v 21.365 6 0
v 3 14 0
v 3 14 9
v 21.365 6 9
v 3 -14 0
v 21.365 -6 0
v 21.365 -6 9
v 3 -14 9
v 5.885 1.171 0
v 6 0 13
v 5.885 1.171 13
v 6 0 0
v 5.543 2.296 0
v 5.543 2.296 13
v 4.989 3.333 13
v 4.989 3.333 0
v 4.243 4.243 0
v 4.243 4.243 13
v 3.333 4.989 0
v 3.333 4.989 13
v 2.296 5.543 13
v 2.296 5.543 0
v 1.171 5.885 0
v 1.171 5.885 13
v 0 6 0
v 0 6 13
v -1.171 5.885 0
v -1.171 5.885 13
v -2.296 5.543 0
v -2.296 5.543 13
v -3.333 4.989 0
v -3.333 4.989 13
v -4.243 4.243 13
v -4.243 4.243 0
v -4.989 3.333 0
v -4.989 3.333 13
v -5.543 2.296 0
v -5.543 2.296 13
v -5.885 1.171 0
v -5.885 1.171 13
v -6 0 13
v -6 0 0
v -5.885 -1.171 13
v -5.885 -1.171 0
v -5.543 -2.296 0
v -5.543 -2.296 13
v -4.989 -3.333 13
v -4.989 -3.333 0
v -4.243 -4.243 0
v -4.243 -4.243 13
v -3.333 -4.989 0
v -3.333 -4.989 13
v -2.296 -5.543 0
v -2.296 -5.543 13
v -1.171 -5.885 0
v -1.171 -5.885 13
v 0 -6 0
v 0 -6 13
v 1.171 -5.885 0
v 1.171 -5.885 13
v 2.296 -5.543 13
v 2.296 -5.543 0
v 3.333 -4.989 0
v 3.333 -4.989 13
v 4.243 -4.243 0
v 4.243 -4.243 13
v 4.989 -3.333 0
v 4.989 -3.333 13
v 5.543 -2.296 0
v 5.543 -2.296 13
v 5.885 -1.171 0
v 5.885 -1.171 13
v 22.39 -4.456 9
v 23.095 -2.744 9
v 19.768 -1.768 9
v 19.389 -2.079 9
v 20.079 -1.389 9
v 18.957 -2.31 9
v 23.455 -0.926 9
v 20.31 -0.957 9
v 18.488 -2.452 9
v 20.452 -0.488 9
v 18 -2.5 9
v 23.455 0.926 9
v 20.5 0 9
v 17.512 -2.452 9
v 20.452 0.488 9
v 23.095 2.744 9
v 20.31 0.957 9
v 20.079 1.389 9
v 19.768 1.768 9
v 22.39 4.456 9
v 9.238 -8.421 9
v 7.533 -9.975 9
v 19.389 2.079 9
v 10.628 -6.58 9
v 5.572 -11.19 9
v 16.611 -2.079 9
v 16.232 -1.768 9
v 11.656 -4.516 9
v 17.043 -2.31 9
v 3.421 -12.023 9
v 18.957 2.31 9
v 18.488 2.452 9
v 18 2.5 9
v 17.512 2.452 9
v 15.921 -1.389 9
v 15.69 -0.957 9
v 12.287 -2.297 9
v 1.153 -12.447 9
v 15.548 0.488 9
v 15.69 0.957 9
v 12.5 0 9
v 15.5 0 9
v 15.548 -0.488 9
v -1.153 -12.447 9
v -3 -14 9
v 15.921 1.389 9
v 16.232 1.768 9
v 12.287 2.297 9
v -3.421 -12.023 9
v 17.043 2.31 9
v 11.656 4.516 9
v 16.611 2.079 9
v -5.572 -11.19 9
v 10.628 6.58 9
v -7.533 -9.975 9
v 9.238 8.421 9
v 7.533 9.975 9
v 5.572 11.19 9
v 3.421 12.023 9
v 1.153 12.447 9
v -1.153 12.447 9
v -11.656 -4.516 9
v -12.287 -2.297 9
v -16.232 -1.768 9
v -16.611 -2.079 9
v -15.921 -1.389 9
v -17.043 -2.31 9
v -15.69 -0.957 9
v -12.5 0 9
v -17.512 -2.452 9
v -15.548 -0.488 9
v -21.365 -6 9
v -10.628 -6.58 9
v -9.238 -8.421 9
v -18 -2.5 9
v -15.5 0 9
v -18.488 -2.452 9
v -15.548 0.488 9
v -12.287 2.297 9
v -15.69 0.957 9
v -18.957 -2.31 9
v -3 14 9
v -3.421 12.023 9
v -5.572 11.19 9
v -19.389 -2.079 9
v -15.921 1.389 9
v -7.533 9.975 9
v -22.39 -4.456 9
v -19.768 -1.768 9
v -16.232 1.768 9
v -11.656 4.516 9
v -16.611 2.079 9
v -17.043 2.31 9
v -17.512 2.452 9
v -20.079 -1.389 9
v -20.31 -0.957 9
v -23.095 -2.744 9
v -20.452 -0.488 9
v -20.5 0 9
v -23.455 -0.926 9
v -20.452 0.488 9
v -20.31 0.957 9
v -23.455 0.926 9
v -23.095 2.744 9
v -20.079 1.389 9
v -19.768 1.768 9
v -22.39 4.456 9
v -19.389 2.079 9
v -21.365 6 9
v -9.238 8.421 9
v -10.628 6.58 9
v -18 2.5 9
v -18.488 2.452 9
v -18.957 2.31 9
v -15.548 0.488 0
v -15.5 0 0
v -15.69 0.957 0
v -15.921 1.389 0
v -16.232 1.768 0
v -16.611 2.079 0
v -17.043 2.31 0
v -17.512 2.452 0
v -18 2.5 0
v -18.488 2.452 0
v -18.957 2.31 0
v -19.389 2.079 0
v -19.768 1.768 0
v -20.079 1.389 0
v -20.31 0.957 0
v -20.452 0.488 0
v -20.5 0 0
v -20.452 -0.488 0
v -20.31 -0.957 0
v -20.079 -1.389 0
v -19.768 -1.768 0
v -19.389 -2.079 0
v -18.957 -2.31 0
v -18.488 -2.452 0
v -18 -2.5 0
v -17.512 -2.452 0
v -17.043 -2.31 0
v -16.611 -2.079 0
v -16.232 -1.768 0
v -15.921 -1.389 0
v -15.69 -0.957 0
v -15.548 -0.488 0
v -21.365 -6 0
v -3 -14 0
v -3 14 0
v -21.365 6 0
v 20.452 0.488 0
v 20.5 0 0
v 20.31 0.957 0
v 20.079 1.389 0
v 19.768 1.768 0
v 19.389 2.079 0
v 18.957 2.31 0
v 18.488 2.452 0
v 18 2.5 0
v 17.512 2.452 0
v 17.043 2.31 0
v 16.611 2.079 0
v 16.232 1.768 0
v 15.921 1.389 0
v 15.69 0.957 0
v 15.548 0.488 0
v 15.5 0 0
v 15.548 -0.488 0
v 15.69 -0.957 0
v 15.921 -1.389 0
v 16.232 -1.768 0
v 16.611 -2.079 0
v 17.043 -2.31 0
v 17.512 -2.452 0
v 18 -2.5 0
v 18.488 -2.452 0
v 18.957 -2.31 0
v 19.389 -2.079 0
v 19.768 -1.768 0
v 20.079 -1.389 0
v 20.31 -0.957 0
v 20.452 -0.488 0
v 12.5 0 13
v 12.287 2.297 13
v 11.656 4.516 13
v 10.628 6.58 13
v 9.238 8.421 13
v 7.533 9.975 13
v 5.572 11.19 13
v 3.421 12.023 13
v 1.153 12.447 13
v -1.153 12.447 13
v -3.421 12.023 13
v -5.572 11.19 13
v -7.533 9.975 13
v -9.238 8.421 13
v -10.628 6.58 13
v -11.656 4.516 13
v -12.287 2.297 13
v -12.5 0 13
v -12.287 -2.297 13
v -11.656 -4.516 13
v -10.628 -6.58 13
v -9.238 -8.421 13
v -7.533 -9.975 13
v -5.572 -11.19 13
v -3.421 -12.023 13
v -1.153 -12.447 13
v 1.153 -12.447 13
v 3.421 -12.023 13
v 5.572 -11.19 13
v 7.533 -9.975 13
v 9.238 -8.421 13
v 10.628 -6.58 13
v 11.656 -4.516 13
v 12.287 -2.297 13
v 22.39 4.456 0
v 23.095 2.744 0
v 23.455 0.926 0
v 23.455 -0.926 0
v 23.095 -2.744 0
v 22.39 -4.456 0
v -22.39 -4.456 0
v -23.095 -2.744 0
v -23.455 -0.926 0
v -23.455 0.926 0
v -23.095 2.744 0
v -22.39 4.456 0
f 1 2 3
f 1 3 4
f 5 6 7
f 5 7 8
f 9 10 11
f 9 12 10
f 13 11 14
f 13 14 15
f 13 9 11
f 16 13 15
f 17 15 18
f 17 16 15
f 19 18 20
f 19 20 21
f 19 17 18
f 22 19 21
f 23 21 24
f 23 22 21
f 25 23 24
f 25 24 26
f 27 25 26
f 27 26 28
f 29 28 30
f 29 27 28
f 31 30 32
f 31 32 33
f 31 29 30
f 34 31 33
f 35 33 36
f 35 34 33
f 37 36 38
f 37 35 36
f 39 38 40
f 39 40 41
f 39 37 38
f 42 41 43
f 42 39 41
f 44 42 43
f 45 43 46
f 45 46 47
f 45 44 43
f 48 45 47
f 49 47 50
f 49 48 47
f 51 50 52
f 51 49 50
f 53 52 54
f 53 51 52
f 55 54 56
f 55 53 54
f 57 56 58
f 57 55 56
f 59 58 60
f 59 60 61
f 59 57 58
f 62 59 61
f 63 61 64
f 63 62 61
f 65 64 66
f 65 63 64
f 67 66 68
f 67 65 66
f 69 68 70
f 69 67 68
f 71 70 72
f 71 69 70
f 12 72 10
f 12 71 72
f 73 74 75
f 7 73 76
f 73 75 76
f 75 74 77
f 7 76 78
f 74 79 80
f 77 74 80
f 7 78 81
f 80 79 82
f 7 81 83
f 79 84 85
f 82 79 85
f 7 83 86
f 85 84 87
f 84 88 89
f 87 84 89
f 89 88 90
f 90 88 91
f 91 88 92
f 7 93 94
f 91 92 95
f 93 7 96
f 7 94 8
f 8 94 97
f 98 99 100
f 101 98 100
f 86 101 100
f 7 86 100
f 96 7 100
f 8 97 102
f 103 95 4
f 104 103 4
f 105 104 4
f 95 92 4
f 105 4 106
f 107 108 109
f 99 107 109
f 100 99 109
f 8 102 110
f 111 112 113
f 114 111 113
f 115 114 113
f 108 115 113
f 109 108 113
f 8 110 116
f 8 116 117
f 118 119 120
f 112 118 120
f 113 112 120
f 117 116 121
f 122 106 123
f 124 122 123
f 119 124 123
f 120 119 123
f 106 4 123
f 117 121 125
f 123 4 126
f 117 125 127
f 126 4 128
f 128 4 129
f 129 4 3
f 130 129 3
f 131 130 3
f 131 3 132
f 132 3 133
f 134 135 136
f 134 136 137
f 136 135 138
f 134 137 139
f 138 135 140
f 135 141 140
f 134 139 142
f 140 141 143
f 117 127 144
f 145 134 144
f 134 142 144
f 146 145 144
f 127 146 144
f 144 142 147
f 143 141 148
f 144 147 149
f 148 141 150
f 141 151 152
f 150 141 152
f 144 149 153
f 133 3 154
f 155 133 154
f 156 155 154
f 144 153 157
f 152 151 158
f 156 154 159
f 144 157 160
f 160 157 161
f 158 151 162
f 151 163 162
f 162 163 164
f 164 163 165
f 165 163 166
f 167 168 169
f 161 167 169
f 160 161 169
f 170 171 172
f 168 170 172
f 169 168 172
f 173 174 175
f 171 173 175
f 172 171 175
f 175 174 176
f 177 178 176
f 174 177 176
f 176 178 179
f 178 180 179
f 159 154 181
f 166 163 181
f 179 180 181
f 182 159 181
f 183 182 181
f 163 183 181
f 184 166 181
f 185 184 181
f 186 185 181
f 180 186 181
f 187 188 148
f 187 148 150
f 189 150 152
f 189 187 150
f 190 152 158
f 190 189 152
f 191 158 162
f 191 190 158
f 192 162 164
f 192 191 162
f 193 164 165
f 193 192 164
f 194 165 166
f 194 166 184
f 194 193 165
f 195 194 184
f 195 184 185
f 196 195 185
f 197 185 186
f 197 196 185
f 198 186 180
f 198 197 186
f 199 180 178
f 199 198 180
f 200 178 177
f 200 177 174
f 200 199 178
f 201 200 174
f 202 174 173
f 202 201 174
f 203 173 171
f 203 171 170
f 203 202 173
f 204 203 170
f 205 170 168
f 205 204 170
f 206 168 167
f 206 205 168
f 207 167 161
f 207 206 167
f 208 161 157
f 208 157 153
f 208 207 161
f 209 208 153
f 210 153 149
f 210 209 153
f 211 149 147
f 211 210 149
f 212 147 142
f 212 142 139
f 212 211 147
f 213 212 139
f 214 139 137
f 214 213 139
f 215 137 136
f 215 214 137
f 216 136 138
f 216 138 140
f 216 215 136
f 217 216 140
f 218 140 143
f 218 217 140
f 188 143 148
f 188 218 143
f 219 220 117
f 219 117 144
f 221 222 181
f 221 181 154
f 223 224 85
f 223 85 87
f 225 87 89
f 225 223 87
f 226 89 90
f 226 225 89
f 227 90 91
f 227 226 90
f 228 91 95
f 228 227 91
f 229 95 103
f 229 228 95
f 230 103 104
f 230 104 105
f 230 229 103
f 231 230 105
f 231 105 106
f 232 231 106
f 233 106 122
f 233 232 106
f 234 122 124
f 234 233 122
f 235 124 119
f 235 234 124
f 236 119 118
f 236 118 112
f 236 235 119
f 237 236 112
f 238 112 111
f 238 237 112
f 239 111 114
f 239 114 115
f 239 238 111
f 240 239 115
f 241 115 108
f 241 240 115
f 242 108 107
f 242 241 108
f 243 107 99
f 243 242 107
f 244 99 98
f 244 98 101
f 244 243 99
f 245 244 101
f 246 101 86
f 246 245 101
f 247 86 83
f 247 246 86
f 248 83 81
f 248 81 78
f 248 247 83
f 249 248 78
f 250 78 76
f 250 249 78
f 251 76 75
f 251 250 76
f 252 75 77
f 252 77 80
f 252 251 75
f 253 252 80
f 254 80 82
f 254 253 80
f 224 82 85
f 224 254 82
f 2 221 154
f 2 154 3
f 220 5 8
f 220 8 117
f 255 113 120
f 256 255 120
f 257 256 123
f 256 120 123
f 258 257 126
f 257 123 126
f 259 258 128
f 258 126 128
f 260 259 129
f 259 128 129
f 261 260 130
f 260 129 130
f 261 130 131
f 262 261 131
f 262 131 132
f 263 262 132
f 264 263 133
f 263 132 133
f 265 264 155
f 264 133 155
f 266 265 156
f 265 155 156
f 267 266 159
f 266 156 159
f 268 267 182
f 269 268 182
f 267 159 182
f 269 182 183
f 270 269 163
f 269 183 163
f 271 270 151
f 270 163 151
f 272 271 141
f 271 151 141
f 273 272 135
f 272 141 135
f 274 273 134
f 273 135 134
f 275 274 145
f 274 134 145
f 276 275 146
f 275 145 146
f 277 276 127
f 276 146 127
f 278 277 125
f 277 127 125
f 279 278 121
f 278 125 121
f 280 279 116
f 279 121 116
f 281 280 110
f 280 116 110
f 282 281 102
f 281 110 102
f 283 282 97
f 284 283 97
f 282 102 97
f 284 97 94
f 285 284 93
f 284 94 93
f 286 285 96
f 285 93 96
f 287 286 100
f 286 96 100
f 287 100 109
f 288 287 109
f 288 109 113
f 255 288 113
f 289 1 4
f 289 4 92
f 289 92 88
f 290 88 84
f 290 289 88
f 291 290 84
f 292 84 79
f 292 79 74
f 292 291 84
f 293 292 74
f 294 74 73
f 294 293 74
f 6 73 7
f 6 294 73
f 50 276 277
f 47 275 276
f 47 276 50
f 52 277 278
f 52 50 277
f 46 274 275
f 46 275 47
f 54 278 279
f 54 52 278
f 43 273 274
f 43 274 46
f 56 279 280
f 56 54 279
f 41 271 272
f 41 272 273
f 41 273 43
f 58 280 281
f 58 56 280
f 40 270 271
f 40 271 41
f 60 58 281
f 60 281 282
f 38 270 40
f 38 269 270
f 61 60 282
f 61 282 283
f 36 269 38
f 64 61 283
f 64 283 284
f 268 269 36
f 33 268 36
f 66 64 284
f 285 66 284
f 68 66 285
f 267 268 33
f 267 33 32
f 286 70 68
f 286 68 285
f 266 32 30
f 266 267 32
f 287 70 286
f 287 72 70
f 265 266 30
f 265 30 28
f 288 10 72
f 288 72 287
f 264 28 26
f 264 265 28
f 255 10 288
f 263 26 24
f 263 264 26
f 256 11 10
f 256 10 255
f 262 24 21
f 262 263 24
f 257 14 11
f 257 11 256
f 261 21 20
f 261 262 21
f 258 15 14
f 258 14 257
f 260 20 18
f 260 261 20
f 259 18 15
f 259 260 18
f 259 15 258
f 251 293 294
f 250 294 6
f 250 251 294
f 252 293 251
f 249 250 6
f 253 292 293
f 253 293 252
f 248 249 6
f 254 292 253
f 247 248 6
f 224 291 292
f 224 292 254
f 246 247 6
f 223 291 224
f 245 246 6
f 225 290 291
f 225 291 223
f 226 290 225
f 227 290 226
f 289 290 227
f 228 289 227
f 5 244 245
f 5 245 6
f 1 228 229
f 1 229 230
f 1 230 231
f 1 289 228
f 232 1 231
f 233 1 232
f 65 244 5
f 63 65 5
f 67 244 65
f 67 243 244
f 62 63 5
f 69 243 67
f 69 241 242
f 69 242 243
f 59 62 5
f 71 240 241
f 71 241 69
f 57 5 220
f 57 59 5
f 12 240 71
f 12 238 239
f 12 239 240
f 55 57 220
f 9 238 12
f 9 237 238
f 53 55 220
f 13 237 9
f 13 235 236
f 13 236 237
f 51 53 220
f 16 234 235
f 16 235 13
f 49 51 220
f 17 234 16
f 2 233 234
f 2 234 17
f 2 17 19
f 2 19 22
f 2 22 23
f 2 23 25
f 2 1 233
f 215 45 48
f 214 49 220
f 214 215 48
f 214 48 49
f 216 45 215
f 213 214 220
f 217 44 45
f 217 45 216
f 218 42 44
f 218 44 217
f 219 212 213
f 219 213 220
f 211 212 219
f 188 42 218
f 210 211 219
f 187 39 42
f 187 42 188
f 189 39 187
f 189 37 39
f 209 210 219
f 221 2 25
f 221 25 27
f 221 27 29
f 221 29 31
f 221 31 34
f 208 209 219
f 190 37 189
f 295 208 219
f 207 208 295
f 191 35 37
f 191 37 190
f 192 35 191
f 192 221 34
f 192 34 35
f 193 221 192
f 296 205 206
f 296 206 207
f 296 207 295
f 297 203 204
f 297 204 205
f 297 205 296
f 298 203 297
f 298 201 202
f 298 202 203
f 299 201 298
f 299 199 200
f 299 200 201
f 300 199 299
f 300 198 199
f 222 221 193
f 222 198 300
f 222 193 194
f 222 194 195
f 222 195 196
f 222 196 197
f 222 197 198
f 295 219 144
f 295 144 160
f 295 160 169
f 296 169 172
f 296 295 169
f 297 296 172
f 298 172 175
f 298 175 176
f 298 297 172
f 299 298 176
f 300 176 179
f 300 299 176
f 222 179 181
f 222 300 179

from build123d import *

# Parameters (mm, degrees)
SKETCH1_R           = 2.5
SKETCH1_R_2         = 6
BOSS_EXTRUDE1_DEPTH = 9
SKETCH2_R           = 12.5
SKETCH2_R_2         = 6
BOSS_EXTRUDE2_DEPTH = 4


with BuildPart() as part:
    # Sketch1 → Boss-Extrude1 (new body)
    with BuildSketch(Plane.XY):
        with BuildLine():
            Line((21.365459931, -6), (3, -14))
            Line((3, -14), (-3, -14))
            Line((-3, -14), (-21.365459931, -6))
            ThreePointArc((-21.365459931, -6), (-23.5, 0), (-21.365459931, 6))
            Line((-21.365459931, 6), (-3, 14))
            Line((-3, 14), (3, 14))
            Line((3, 14), (21.365459931, 6))
            ThreePointArc((21.365459931, 6), (23.5, 0), (21.365459931, -6))
        make_face()
        with Locations((-18, 0)):
            Circle(SKETCH1_R, mode=Mode.SUBTRACT)
        with Locations((18, 0)):
            Circle(SKETCH1_R, mode=Mode.SUBTRACT)
        Circle(SKETCH1_R_2, mode=Mode.SUBTRACT)
    extrude(amount=BOSS_EXTRUDE1_DEPTH)

    # Sketch2 → Boss-Extrude2 (add)
    with BuildSketch(Plane.XY.offset(9)):
        Circle(SKETCH2_R)
        Circle(SKETCH2_R_2, mode=Mode.SUBTRACT)
    extrude(amount=BOSS_EXTRUDE2_DEPTH)


solid = part.part
